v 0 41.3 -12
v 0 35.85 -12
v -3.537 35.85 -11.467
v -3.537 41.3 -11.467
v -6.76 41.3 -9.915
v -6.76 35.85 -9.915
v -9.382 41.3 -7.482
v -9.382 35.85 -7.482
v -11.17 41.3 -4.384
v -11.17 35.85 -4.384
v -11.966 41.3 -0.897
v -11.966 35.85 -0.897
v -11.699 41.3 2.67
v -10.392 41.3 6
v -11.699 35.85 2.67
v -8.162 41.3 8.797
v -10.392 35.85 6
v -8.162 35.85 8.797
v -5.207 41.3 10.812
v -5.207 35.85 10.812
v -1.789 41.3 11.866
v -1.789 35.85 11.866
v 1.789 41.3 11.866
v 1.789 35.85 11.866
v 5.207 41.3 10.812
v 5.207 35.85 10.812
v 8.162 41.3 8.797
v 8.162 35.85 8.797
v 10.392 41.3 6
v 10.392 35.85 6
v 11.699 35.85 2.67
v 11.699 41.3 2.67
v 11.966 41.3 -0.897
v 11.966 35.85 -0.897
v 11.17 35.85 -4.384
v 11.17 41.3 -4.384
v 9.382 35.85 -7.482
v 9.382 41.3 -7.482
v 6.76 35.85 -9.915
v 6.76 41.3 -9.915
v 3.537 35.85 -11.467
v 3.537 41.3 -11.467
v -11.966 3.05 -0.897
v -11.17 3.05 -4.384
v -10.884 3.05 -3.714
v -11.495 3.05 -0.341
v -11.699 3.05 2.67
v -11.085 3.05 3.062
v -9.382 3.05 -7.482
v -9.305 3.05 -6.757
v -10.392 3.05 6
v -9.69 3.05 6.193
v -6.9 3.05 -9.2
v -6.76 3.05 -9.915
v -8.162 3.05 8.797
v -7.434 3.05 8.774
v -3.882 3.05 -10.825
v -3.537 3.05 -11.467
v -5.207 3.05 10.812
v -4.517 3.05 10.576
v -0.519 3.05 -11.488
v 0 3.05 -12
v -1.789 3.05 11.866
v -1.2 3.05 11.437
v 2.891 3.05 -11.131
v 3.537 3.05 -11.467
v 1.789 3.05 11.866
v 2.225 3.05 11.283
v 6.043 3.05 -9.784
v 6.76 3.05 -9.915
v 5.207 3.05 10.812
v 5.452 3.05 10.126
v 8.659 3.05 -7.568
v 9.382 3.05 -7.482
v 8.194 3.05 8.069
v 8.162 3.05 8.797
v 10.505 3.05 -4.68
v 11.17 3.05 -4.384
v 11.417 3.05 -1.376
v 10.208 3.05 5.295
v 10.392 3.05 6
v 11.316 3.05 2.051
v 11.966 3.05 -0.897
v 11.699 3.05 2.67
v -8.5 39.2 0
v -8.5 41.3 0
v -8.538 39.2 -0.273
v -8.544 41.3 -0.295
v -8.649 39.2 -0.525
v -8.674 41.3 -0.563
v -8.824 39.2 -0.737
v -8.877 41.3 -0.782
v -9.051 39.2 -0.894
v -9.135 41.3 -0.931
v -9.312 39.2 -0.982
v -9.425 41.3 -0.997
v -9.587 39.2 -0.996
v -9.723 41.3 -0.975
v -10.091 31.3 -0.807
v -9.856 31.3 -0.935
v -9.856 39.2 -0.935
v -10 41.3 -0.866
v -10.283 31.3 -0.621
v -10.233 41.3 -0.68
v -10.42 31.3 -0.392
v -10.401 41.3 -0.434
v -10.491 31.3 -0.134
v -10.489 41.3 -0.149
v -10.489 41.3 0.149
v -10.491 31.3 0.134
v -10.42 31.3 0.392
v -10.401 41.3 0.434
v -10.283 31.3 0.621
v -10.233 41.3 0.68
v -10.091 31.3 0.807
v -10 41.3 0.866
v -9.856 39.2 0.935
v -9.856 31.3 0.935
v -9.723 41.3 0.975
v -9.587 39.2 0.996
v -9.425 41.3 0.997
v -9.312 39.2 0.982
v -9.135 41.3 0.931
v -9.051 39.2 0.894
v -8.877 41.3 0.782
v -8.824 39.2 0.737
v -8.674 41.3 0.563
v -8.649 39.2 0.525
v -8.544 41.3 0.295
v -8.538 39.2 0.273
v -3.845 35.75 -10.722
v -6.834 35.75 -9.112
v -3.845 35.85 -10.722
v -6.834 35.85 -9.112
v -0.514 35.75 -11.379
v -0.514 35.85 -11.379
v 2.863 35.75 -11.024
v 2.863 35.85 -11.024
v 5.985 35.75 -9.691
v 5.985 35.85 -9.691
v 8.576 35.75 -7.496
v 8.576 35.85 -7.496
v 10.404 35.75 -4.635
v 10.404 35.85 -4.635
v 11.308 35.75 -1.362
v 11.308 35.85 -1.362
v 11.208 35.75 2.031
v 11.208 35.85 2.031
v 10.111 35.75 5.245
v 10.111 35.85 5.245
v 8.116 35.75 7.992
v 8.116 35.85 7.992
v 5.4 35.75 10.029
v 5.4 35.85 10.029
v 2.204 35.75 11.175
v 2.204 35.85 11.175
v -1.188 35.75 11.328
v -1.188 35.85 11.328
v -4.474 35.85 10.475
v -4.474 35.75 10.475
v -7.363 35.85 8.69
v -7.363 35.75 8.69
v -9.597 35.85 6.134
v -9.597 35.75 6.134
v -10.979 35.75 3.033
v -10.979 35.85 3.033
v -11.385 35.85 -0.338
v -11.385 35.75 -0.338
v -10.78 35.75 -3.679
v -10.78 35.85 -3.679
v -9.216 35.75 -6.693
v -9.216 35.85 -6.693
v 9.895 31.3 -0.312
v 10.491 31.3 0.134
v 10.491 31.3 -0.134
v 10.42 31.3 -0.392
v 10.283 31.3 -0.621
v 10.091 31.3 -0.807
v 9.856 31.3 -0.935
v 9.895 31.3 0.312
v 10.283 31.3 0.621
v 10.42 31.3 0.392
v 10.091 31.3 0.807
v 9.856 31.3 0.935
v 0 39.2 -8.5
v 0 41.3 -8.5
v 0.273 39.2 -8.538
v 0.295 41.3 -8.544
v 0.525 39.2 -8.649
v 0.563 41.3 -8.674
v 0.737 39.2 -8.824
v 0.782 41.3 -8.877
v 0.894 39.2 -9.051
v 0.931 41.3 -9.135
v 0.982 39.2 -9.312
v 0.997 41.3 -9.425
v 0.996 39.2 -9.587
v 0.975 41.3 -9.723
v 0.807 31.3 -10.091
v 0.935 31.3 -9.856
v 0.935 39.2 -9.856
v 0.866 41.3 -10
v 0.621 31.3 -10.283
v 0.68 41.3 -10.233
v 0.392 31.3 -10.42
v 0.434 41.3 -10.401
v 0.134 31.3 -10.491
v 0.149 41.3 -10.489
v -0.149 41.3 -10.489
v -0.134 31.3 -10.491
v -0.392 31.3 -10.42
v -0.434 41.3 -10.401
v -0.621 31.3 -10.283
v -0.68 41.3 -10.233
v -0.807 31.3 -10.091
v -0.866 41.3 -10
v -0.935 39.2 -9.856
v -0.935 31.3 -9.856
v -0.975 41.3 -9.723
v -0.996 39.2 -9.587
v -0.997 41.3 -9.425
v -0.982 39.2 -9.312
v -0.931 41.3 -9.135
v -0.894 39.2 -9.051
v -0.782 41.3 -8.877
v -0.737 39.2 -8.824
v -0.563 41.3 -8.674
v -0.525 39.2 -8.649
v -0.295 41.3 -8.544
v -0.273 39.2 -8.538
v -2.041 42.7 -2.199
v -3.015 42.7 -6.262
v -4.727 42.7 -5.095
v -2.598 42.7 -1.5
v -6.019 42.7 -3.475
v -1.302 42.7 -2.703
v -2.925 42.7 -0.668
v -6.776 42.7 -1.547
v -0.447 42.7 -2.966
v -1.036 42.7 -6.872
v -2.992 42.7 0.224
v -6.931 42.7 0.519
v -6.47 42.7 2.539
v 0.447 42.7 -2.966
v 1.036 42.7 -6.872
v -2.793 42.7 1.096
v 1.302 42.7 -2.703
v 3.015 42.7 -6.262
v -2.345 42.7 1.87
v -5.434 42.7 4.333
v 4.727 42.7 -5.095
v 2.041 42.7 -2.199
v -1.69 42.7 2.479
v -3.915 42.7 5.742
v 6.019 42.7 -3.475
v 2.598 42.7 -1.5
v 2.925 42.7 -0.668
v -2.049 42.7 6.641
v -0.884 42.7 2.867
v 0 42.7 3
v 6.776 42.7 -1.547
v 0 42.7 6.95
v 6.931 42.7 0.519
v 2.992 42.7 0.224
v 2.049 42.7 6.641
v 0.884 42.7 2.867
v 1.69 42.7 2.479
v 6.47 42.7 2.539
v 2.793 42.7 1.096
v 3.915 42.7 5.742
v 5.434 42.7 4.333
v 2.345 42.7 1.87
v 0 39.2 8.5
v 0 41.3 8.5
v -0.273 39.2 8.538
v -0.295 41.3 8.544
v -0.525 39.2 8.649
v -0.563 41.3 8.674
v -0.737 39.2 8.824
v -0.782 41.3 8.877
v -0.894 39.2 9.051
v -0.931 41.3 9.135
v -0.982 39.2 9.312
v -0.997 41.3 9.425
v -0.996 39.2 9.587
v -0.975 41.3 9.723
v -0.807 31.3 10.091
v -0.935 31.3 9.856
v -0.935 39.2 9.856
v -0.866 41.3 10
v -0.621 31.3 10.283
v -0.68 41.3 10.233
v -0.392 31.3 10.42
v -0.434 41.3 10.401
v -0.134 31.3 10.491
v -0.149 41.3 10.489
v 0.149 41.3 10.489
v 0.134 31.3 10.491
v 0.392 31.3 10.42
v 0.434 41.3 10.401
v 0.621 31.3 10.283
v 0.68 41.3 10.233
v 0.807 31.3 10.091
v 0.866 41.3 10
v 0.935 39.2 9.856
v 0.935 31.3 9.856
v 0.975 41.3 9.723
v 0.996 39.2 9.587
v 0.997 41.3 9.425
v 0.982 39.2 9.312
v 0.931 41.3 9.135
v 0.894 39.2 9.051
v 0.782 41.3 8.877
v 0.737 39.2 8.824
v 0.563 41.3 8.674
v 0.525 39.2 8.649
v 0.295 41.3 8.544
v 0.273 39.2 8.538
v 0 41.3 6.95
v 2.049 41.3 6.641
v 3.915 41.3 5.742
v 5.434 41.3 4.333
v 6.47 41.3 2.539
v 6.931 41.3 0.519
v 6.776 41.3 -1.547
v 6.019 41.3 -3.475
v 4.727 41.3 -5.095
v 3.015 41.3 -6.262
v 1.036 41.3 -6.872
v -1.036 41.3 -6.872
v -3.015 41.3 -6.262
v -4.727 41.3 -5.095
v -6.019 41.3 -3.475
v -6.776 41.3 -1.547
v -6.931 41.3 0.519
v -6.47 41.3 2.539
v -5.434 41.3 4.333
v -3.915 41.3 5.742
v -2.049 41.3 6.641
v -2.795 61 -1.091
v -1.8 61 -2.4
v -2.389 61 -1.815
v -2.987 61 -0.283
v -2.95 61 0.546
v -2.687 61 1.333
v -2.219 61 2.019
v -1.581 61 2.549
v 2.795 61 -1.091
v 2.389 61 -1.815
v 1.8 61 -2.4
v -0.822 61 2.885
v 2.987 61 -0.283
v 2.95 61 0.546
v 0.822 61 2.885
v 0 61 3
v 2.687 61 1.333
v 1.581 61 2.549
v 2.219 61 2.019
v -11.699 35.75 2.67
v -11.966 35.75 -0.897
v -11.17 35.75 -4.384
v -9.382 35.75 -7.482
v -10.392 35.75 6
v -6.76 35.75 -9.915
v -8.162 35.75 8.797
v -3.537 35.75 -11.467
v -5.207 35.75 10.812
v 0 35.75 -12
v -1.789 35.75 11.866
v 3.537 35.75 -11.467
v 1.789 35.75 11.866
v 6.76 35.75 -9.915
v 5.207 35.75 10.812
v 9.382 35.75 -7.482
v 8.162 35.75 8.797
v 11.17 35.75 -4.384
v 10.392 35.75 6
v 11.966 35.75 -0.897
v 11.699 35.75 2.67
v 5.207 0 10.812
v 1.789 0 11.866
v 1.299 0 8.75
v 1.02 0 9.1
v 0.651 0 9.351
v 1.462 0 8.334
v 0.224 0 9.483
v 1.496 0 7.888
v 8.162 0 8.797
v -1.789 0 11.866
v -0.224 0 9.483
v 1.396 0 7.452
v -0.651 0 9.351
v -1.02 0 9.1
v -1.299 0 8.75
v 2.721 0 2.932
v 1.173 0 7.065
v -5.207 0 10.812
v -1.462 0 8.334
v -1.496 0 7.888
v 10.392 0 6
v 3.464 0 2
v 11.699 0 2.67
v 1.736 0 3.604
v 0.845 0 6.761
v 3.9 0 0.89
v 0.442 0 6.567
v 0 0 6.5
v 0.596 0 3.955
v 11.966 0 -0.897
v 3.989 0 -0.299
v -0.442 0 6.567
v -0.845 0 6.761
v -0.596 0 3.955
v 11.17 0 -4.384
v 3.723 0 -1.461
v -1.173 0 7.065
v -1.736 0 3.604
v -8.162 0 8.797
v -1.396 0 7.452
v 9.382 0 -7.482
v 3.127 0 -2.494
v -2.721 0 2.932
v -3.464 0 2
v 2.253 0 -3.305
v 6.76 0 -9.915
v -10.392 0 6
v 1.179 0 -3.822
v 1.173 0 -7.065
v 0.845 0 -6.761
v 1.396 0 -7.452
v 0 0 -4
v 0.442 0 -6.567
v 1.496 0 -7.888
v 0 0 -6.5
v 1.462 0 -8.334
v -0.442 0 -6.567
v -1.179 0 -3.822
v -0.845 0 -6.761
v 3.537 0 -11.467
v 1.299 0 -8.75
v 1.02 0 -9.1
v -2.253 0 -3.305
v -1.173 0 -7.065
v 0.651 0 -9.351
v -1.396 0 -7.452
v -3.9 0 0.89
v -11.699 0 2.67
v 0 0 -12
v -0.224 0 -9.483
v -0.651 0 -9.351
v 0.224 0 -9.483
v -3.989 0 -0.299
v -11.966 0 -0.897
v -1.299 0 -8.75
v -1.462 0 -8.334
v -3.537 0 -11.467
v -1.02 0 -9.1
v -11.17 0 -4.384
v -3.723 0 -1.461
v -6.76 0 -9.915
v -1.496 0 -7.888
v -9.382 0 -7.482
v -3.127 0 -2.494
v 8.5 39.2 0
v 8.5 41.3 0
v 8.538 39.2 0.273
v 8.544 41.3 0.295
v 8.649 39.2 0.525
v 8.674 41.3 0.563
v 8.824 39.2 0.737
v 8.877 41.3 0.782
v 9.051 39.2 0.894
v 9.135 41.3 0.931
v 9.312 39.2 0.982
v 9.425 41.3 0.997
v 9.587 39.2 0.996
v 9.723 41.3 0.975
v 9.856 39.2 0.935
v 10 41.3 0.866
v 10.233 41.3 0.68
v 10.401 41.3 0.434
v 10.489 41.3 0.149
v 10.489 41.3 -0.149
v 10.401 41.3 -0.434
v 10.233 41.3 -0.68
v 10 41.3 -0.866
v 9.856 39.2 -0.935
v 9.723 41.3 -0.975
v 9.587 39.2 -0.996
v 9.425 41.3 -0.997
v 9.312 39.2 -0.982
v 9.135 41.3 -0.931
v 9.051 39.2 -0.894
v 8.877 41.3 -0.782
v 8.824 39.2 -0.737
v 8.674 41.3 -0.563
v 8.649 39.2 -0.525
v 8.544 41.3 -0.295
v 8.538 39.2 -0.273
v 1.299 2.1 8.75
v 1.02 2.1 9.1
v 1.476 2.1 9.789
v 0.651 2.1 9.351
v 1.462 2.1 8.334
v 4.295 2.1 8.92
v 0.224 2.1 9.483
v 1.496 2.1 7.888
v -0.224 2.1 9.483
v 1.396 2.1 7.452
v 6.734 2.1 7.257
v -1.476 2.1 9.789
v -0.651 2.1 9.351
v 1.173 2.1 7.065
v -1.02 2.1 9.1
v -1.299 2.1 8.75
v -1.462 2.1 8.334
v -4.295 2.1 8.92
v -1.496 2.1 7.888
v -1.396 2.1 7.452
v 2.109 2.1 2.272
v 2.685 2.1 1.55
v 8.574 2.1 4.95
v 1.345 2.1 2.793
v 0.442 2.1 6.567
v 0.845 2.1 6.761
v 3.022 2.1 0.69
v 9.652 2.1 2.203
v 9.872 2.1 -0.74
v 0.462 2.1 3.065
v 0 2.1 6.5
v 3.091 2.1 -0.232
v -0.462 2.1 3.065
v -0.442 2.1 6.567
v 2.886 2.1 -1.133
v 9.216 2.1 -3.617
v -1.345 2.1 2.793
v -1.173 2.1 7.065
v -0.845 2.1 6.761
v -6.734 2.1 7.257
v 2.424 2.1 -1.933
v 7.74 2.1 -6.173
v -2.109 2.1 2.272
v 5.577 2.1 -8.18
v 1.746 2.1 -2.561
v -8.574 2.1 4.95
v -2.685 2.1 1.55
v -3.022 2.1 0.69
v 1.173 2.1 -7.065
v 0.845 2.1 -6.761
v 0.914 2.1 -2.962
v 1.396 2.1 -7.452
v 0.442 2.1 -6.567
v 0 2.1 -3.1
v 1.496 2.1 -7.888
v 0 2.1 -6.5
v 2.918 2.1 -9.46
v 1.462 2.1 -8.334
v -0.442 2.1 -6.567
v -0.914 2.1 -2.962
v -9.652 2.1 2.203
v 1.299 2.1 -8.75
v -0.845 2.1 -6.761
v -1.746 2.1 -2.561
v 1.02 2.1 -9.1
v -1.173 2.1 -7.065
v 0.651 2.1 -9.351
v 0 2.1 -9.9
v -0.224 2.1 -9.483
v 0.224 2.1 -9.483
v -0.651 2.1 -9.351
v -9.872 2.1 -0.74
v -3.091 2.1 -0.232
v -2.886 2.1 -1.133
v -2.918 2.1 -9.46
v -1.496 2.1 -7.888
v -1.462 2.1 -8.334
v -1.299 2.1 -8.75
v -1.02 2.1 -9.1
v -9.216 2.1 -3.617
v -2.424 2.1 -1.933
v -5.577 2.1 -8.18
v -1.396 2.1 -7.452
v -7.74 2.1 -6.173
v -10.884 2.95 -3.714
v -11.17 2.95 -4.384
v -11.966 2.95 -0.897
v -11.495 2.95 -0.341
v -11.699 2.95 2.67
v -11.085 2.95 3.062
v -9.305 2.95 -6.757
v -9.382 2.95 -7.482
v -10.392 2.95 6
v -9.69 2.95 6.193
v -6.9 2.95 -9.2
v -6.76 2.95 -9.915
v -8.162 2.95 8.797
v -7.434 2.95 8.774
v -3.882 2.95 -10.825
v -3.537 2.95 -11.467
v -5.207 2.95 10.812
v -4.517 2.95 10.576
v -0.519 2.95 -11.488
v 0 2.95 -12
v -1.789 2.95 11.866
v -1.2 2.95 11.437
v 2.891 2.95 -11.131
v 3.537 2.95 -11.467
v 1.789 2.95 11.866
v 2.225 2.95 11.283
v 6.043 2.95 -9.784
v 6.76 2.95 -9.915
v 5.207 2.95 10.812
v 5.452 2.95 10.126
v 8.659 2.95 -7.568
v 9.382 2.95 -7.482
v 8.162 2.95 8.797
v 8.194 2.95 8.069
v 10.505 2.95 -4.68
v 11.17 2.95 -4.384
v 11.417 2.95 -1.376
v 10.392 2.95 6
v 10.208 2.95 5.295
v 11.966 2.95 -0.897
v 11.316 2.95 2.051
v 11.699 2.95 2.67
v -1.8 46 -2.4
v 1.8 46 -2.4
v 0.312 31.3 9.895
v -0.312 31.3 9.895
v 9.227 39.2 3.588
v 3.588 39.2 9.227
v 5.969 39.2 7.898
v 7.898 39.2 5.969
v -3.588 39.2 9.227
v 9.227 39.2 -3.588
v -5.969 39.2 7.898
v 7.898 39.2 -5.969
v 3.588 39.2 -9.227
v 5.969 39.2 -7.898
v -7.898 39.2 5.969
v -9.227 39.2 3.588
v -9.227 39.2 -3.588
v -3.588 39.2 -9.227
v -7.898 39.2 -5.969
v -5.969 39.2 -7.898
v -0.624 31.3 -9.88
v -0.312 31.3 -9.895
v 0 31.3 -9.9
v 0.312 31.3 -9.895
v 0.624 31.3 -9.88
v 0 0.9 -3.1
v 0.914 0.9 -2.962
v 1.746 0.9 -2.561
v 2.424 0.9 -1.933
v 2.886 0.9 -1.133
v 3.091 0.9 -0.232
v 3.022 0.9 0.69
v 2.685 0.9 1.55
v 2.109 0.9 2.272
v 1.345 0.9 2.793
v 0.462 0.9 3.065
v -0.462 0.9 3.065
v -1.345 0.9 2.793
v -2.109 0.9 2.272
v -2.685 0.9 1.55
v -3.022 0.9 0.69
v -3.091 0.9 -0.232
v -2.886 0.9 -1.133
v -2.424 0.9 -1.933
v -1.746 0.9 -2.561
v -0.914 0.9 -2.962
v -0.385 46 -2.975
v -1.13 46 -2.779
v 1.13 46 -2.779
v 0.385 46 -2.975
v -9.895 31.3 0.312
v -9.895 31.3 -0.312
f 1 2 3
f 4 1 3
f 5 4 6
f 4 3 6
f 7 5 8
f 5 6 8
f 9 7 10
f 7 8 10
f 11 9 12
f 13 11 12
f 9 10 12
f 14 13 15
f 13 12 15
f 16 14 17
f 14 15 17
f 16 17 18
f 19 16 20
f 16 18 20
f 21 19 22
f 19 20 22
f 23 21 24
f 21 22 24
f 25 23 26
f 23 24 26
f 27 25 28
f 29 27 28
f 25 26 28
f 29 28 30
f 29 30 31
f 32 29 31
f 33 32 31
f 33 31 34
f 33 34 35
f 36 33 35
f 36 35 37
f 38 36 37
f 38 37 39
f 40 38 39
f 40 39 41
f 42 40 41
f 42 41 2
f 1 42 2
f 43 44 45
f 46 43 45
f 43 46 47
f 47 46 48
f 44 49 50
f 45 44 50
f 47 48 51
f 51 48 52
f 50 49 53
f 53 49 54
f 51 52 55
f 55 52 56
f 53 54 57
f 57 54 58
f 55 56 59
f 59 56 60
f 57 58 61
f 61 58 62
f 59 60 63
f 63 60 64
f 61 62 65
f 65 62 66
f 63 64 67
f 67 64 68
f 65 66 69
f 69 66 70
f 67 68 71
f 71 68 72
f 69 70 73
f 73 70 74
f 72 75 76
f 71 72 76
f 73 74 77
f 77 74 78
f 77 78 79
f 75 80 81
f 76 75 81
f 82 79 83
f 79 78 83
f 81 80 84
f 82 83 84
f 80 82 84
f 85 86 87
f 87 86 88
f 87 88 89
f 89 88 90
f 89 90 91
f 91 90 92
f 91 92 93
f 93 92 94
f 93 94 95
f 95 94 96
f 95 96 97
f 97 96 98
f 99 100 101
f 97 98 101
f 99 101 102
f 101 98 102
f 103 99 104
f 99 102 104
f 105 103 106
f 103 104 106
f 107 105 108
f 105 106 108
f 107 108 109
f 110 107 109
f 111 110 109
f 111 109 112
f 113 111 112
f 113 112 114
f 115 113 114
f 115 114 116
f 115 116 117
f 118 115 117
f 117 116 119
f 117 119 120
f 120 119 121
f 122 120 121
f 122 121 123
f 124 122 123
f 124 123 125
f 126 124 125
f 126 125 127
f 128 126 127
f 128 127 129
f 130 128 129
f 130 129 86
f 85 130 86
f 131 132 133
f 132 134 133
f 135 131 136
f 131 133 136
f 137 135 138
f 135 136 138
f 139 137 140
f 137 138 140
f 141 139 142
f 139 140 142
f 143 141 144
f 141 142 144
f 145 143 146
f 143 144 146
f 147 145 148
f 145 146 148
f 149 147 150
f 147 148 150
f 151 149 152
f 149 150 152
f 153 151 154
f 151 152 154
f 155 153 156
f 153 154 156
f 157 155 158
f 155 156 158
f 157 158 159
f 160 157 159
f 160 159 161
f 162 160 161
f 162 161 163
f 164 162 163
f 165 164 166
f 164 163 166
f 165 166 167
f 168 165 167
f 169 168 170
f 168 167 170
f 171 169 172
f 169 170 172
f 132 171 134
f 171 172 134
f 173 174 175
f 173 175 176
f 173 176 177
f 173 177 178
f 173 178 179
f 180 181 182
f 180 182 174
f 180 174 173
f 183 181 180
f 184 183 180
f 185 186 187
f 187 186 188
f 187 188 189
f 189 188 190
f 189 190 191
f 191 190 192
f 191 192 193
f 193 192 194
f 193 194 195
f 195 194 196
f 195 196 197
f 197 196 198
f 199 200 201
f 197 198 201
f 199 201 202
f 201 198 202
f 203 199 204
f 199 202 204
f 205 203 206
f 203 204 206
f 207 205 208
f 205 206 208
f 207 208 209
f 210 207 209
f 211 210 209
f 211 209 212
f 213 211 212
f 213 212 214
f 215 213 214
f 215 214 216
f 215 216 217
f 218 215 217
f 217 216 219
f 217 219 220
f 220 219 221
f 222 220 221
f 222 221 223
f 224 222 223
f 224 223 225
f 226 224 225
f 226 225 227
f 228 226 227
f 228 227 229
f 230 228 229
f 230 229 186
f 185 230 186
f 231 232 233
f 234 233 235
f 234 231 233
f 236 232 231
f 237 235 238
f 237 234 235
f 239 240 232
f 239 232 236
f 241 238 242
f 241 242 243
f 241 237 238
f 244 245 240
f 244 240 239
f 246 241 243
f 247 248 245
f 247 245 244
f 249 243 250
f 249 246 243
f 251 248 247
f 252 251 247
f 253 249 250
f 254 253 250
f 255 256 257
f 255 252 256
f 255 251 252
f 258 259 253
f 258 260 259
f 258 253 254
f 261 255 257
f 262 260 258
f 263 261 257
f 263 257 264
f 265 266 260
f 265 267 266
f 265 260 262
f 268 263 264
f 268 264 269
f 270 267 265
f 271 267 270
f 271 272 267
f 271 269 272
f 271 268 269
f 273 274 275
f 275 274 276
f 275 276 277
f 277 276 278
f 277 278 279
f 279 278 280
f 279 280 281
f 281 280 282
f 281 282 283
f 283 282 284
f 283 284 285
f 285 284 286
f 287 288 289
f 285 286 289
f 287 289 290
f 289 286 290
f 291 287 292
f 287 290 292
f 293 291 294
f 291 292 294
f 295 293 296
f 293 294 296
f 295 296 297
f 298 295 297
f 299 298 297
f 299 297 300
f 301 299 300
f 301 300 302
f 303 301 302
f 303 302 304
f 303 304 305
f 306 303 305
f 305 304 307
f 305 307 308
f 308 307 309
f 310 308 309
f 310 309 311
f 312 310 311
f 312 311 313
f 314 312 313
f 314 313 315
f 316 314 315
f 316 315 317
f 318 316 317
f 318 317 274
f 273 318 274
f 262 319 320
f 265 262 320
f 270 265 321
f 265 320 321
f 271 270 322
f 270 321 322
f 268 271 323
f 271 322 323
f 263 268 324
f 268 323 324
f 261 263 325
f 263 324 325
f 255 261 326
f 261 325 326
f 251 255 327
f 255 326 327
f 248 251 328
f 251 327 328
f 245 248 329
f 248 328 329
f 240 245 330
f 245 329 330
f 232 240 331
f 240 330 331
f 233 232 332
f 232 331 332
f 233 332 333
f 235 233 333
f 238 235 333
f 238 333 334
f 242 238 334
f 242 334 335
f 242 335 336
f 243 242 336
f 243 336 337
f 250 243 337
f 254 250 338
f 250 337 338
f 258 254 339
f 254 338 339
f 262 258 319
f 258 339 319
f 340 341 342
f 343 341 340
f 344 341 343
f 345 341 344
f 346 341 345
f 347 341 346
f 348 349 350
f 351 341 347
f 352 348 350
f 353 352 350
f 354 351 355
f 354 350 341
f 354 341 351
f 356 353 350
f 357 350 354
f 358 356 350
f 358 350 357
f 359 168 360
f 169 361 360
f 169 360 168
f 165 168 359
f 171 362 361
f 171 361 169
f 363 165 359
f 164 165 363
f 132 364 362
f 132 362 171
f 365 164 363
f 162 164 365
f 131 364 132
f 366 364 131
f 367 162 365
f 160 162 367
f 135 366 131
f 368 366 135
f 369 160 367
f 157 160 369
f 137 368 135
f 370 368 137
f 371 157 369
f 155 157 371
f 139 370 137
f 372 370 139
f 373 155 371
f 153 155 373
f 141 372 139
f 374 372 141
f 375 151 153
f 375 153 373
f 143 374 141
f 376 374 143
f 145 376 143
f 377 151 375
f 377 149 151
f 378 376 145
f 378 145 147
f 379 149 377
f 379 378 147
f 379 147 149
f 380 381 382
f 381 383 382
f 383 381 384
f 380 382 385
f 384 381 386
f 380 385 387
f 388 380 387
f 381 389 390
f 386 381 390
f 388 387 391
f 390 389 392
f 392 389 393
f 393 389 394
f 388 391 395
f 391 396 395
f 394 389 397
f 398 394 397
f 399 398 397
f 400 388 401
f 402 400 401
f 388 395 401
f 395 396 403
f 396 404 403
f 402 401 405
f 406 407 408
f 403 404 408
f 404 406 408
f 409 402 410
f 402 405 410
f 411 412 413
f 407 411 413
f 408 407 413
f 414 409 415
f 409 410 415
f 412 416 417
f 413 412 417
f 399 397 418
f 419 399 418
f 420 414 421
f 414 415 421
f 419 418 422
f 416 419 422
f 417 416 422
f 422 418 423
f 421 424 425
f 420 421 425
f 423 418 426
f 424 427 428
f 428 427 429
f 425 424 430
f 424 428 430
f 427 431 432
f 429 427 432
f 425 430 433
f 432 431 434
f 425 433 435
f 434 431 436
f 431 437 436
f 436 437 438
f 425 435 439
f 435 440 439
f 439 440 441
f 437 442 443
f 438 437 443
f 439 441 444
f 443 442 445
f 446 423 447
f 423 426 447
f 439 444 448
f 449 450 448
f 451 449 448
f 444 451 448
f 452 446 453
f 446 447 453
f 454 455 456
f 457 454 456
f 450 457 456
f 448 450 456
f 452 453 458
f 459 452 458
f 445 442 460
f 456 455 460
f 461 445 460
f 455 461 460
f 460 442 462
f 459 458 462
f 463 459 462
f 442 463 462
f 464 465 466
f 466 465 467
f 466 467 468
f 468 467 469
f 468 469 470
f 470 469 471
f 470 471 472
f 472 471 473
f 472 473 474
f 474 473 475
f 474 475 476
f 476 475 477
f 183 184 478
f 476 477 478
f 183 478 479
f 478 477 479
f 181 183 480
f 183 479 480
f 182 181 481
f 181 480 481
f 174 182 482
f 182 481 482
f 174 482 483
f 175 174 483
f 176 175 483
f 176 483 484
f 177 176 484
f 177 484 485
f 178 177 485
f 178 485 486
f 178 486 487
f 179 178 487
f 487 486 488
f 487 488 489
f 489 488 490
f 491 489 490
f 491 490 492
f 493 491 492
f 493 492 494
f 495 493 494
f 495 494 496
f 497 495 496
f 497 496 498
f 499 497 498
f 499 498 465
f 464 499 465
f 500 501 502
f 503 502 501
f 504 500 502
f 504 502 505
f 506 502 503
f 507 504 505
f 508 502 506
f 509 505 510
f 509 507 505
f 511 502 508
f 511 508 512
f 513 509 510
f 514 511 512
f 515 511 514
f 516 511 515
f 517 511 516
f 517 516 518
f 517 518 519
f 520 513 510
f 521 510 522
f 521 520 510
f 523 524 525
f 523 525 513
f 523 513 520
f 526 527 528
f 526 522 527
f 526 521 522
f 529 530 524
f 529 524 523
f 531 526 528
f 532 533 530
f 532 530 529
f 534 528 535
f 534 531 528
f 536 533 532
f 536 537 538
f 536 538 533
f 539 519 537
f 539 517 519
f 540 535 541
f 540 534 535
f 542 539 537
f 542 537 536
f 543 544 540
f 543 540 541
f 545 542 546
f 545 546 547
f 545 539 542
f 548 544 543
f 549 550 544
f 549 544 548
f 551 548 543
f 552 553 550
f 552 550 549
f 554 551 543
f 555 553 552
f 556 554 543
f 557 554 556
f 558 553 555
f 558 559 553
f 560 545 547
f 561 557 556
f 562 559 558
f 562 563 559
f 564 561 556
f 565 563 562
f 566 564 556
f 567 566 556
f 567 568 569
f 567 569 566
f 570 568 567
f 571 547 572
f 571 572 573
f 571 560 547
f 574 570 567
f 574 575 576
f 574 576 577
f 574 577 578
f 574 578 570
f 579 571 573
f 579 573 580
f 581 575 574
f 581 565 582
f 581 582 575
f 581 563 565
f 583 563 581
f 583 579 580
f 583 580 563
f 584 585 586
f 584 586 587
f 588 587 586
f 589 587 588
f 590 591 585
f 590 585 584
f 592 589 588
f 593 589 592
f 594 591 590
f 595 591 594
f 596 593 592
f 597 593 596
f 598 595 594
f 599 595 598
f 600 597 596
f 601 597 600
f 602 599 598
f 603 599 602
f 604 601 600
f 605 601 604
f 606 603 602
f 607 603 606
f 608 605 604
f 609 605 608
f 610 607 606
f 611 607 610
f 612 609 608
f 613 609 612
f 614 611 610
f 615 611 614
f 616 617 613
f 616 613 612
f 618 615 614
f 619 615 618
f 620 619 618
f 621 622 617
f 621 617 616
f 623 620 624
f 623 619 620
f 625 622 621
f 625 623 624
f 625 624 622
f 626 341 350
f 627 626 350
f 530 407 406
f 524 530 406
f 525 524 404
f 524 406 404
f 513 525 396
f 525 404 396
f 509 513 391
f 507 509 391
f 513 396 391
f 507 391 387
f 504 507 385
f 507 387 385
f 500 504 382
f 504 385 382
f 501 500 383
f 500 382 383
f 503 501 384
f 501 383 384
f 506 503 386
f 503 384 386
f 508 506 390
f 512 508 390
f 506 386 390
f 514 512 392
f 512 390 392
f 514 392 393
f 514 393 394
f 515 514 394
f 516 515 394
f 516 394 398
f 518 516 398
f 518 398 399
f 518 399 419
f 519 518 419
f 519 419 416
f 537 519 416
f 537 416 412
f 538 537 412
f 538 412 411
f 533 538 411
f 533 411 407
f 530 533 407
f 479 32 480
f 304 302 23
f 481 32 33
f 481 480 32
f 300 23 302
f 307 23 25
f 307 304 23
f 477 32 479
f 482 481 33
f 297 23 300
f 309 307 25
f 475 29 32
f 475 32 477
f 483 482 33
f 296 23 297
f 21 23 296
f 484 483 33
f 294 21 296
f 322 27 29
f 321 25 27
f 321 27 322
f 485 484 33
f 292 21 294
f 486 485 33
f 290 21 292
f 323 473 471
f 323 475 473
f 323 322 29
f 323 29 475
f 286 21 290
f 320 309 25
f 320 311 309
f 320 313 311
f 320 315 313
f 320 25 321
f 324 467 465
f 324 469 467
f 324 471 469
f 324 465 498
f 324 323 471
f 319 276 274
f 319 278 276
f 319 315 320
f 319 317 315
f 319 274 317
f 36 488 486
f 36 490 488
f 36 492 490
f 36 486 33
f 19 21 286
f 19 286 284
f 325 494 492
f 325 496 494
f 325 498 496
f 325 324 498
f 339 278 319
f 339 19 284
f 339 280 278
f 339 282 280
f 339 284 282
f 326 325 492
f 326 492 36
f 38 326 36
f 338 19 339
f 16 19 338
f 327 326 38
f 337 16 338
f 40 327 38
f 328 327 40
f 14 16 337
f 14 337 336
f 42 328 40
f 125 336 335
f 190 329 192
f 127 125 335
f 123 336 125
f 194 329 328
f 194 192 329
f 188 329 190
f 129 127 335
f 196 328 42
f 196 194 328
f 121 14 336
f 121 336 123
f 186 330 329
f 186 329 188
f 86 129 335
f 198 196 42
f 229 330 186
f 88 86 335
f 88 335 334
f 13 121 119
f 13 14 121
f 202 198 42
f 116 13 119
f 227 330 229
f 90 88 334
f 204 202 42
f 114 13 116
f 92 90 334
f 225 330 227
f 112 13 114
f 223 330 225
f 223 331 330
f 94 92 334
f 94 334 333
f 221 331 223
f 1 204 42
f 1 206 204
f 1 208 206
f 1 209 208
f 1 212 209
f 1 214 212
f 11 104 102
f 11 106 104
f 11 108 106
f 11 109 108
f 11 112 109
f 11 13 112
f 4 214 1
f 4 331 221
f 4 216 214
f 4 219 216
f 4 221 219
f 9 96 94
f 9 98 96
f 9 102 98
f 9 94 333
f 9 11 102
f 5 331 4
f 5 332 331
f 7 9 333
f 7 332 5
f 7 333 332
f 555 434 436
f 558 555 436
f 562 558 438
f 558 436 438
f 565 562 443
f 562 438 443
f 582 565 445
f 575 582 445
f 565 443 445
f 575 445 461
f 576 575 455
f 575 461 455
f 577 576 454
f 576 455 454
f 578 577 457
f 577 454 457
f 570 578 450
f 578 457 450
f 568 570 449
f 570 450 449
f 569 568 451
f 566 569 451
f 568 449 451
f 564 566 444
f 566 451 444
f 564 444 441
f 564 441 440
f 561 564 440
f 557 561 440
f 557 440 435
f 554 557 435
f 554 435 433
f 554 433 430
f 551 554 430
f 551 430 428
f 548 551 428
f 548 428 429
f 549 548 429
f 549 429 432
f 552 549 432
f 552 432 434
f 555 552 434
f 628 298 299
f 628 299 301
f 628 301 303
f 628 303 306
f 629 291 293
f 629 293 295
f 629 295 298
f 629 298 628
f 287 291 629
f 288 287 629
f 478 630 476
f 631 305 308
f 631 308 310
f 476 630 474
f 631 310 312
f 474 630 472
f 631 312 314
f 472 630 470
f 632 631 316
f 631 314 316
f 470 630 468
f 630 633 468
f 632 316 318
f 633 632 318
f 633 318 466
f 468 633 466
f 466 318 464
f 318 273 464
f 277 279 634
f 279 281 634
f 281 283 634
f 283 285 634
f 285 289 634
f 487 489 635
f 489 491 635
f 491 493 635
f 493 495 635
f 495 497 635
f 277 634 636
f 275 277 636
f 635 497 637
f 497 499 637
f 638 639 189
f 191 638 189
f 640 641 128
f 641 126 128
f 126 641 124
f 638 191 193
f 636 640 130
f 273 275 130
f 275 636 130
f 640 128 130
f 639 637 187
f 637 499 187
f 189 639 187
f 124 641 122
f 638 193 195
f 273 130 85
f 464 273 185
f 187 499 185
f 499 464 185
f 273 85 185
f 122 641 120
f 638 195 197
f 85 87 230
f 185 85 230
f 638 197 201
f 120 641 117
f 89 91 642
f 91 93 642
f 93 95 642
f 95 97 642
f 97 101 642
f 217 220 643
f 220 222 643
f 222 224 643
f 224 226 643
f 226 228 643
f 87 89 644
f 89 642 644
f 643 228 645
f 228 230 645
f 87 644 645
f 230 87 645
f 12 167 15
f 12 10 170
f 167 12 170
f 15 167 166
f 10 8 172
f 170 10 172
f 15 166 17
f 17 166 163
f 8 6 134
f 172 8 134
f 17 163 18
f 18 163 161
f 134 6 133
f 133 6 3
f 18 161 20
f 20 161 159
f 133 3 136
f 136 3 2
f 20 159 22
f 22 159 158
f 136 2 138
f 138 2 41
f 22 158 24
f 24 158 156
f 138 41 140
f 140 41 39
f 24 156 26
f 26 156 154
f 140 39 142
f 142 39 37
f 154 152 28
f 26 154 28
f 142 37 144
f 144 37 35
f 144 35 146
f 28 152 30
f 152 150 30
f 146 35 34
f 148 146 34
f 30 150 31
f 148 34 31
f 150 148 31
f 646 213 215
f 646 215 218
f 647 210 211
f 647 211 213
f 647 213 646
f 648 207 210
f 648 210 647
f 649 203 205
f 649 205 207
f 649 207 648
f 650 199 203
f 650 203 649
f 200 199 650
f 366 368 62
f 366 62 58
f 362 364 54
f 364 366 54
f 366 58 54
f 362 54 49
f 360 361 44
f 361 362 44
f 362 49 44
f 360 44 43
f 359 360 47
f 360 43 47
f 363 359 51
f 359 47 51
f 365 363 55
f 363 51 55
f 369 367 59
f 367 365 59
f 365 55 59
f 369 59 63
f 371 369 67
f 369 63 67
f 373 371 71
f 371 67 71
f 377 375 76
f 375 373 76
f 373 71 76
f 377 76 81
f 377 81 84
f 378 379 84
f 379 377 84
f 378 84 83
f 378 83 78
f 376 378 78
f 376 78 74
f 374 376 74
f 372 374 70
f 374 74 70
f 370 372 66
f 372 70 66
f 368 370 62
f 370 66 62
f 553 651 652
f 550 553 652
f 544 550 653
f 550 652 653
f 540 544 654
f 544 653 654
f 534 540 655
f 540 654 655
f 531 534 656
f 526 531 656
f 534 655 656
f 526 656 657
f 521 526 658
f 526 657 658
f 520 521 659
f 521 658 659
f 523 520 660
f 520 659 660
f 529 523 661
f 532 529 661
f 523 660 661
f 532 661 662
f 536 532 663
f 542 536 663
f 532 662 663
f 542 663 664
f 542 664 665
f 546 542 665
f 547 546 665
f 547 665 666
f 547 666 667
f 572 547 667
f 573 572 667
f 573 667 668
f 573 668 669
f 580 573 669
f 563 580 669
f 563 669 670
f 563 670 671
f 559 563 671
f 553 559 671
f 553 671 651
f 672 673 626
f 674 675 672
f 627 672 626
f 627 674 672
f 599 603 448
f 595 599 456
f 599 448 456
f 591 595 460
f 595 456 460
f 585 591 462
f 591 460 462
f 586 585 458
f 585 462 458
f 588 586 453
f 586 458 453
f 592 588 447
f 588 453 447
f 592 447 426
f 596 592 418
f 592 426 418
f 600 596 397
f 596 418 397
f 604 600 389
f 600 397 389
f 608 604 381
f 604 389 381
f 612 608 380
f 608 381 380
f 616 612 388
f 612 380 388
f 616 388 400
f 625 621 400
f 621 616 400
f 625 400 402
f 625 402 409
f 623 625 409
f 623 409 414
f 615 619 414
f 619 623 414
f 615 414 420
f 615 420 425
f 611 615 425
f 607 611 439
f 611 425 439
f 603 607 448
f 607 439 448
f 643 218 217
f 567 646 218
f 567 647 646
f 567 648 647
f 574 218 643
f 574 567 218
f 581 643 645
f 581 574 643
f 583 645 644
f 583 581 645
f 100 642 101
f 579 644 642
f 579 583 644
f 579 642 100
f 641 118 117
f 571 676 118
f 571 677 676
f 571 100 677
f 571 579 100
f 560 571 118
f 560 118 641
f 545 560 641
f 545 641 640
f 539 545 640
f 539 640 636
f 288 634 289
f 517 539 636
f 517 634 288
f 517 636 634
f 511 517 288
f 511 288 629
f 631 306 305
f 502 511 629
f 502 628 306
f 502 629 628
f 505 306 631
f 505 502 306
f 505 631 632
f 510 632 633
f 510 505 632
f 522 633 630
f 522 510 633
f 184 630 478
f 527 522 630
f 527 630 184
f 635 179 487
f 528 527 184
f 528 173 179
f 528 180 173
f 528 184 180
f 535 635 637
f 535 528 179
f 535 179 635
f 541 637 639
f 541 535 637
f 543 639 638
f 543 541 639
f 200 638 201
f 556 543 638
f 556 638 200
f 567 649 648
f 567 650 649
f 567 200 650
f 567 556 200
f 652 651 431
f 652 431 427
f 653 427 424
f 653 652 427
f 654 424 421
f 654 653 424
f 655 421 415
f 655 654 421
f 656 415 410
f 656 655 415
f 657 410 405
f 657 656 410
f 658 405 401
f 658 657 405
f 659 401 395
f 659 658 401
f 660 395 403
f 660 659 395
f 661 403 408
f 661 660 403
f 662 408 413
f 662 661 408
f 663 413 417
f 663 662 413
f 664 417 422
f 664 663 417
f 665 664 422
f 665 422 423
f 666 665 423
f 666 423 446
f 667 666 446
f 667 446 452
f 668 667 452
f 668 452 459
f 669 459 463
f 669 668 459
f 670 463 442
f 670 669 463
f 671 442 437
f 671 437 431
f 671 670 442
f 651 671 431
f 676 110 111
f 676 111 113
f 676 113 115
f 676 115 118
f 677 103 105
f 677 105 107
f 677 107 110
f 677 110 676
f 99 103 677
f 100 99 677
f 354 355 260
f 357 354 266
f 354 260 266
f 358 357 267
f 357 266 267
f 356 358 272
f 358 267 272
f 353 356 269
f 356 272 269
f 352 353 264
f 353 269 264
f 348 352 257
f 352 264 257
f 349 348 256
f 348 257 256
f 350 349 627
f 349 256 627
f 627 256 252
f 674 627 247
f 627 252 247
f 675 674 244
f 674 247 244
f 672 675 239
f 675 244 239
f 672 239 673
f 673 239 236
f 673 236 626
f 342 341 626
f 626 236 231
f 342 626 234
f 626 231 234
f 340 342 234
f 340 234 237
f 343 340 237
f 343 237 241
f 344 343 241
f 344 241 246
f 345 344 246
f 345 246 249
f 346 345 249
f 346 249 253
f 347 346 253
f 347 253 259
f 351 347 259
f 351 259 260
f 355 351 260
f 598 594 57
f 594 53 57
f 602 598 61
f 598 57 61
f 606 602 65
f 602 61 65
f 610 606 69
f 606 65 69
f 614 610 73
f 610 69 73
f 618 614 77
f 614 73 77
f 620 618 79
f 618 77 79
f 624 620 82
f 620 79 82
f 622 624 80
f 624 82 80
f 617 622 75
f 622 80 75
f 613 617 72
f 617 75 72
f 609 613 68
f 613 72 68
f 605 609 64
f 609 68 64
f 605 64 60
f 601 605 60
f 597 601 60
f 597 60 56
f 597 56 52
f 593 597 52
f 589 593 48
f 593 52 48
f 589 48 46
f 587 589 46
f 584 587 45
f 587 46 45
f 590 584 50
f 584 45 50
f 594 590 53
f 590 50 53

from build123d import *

# Parameters (mm, degrees)
SKETCH_1_R               = 12
EXTRUDE_1_DEPTH          = 41.3
SHELL_6_T                = 2.1
SKETCH_2_R               = 6.95
EXTRUDE_2_DEPTH          = 1.4
SKETCH_3_R               = 3
EXTRUDE_3_DEPTH          = 18.3
CUT_EXTRUDE_1_DEPTH      = 15
SKETCH_5_R               = 3.1
CUT_EXTRUDE_2_DEPTH      = 10
CHAMFER_1_SIZE           = 0.9
SKETCH_7_R               = 1
CUT_EXTRUDE_3_DEPTH      = 10
PATTERN_CIRCULAR_1_COUNT = 4
SKETCH_8_R               = 1.5
CUT_EXTRUDE_4_DEPTH      = 10
PATTERN_CIRCULAR_2_COUNT = 2
SKETCH_10_W              = 1
SKETCH_10_H              = 0.1


with BuildPart() as part:
    # 草图1 → 凸台-拉伸1 (new body)
    with BuildSketch(Plane(origin=(0, 0, 0), x_dir=(1, 0, 0), z_dir=(0, 1, 0))):
        with Locations(Location((0, 0, 0), (0, 0, 90))):
            Circle(SKETCH_1_R)
    extrude(amount=EXTRUDE_1_DEPTH)

    # 抽壳6 (no face opened: a closed hollow body)
    add(offset(amount=-SHELL_6_T, mode=Mode.PRIVATE), mode=Mode.SUBTRACT)

    # 草图2 → 凸台-拉伸2 (add)
    with BuildSketch(Plane(origin=(0, 41.3, 0), x_dir=(1, 0, 0), z_dir=(0, 1, 0))):
        with Locations(Location((0, 0, 0), (0, 0, 270))):
            Circle(SKETCH_2_R)
    extrude(amount=EXTRUDE_2_DEPTH)

    # 草图3 → 凸台-拉伸3 (add)
    with BuildSketch(Plane(origin=(0, 42.7, 0), x_dir=(1, 0, 0), z_dir=(0, 1, 0))):
        with Locations(Location((0, 0, 0), (0, 0, 270))):
            Circle(SKETCH_3_R)
    extrude(amount=EXTRUDE_3_DEPTH)

    # 草图4 → 切除-拉伸1 (cut)
    with BuildSketch(Plane(origin=(0, 61, 0), x_dir=(1, 0, 0), z_dir=(0, 1, 0))):
        Polygon((-4.180388969, 2.4), (5.154958177, 2.4), (-0.718103627, 5.682759436), align=None)
    extrude(amount=-CUT_EXTRUDE_1_DEPTH, mode=Mode.SUBTRACT)

    # 草图5 → 切除-拉伸2 (cut)
    with BuildSketch(Plane.XZ):
        with Locations(Location((0, 0, 0), (0, 0, 270))):
            Circle(SKETCH_5_R)
    extrude(amount=-CUT_EXTRUDE_2_DEPTH, mode=Mode.SUBTRACT)

    # 倒角1
    chamfer_1_edges = [part.edges().sort_by_distance(p)[0] for p in [
        (0, 0, 3.1),
    ]]
    chamfer(chamfer_1_edges, length=CHAMFER_1_SIZE)

    # 草图7 → 切除-拉伸3 (cut)
    with BuildSketch(Plane(origin=(0, 41.3, 0), x_dir=(1, 0, 0), z_dir=(0, 1, 0))):
        with Locations(Location((0, 9.5, 0), (0, 0, 270))):
            Circle(SKETCH_7_R)
    cut_extrude_3 = extrude(amount=-CUT_EXTRUDE_3_DEPTH, mode=Mode.SUBTRACT)

    # 阵列(圆周)1: 切除-拉伸3 ×4 about axis
    pattern_circular_1_axis = Axis((0, 0, 0), (0, 1, 0))
    for i in range(1, PATTERN_CIRCULAR_1_COUNT):
        add(cut_extrude_3.rotate(pattern_circular_1_axis, i * 360 / PATTERN_CIRCULAR_1_COUNT), mode=Mode.SUBTRACT)

    # 草图8 → 切除-拉伸4 (cut)
    with BuildSketch(Plane.XZ):
        with Locations(Location((0, 8, 0), (0, 0, 270))):
            Circle(SKETCH_8_R)
    cut_extrude_4 = extrude(amount=-CUT_EXTRUDE_4_DEPTH, mode=Mode.SUBTRACT)

    # 阵列(圆周)2: 切除-拉伸4 ×2 about axis
    pattern_circular_2_axis = Axis((0, 0, 0), (0, 1, 0))
    for i in range(1, PATTERN_CIRCULAR_2_COUNT):
        add(cut_extrude_4.rotate(pattern_circular_2_axis, i * 360 / PATTERN_CIRCULAR_2_COUNT), mode=Mode.SUBTRACT)

    # 草图10 → 切除-旋转1 (revolve, cut)
    with BuildSketch(Plane.XY, mode=Mode.PRIVATE) as cut_revolve_1_sk:
        with Locations((11.890198227, 35.8)):
            Rectangle(SKETCH_10_W, SKETCH_10_H)
        with Locations((12, 3)):
            Rectangle(SKETCH_10_W, SKETCH_10_H)
    revolve(cut_revolve_1_sk.sketch.rotate(Axis((0, 62.182119541, 0), (0, -1, 0)), 233.130102354), axis=Axis((0, 62.182119541, 0), (0, -1, 0)), mode=Mode.SUBTRACT)


solid = part.part
